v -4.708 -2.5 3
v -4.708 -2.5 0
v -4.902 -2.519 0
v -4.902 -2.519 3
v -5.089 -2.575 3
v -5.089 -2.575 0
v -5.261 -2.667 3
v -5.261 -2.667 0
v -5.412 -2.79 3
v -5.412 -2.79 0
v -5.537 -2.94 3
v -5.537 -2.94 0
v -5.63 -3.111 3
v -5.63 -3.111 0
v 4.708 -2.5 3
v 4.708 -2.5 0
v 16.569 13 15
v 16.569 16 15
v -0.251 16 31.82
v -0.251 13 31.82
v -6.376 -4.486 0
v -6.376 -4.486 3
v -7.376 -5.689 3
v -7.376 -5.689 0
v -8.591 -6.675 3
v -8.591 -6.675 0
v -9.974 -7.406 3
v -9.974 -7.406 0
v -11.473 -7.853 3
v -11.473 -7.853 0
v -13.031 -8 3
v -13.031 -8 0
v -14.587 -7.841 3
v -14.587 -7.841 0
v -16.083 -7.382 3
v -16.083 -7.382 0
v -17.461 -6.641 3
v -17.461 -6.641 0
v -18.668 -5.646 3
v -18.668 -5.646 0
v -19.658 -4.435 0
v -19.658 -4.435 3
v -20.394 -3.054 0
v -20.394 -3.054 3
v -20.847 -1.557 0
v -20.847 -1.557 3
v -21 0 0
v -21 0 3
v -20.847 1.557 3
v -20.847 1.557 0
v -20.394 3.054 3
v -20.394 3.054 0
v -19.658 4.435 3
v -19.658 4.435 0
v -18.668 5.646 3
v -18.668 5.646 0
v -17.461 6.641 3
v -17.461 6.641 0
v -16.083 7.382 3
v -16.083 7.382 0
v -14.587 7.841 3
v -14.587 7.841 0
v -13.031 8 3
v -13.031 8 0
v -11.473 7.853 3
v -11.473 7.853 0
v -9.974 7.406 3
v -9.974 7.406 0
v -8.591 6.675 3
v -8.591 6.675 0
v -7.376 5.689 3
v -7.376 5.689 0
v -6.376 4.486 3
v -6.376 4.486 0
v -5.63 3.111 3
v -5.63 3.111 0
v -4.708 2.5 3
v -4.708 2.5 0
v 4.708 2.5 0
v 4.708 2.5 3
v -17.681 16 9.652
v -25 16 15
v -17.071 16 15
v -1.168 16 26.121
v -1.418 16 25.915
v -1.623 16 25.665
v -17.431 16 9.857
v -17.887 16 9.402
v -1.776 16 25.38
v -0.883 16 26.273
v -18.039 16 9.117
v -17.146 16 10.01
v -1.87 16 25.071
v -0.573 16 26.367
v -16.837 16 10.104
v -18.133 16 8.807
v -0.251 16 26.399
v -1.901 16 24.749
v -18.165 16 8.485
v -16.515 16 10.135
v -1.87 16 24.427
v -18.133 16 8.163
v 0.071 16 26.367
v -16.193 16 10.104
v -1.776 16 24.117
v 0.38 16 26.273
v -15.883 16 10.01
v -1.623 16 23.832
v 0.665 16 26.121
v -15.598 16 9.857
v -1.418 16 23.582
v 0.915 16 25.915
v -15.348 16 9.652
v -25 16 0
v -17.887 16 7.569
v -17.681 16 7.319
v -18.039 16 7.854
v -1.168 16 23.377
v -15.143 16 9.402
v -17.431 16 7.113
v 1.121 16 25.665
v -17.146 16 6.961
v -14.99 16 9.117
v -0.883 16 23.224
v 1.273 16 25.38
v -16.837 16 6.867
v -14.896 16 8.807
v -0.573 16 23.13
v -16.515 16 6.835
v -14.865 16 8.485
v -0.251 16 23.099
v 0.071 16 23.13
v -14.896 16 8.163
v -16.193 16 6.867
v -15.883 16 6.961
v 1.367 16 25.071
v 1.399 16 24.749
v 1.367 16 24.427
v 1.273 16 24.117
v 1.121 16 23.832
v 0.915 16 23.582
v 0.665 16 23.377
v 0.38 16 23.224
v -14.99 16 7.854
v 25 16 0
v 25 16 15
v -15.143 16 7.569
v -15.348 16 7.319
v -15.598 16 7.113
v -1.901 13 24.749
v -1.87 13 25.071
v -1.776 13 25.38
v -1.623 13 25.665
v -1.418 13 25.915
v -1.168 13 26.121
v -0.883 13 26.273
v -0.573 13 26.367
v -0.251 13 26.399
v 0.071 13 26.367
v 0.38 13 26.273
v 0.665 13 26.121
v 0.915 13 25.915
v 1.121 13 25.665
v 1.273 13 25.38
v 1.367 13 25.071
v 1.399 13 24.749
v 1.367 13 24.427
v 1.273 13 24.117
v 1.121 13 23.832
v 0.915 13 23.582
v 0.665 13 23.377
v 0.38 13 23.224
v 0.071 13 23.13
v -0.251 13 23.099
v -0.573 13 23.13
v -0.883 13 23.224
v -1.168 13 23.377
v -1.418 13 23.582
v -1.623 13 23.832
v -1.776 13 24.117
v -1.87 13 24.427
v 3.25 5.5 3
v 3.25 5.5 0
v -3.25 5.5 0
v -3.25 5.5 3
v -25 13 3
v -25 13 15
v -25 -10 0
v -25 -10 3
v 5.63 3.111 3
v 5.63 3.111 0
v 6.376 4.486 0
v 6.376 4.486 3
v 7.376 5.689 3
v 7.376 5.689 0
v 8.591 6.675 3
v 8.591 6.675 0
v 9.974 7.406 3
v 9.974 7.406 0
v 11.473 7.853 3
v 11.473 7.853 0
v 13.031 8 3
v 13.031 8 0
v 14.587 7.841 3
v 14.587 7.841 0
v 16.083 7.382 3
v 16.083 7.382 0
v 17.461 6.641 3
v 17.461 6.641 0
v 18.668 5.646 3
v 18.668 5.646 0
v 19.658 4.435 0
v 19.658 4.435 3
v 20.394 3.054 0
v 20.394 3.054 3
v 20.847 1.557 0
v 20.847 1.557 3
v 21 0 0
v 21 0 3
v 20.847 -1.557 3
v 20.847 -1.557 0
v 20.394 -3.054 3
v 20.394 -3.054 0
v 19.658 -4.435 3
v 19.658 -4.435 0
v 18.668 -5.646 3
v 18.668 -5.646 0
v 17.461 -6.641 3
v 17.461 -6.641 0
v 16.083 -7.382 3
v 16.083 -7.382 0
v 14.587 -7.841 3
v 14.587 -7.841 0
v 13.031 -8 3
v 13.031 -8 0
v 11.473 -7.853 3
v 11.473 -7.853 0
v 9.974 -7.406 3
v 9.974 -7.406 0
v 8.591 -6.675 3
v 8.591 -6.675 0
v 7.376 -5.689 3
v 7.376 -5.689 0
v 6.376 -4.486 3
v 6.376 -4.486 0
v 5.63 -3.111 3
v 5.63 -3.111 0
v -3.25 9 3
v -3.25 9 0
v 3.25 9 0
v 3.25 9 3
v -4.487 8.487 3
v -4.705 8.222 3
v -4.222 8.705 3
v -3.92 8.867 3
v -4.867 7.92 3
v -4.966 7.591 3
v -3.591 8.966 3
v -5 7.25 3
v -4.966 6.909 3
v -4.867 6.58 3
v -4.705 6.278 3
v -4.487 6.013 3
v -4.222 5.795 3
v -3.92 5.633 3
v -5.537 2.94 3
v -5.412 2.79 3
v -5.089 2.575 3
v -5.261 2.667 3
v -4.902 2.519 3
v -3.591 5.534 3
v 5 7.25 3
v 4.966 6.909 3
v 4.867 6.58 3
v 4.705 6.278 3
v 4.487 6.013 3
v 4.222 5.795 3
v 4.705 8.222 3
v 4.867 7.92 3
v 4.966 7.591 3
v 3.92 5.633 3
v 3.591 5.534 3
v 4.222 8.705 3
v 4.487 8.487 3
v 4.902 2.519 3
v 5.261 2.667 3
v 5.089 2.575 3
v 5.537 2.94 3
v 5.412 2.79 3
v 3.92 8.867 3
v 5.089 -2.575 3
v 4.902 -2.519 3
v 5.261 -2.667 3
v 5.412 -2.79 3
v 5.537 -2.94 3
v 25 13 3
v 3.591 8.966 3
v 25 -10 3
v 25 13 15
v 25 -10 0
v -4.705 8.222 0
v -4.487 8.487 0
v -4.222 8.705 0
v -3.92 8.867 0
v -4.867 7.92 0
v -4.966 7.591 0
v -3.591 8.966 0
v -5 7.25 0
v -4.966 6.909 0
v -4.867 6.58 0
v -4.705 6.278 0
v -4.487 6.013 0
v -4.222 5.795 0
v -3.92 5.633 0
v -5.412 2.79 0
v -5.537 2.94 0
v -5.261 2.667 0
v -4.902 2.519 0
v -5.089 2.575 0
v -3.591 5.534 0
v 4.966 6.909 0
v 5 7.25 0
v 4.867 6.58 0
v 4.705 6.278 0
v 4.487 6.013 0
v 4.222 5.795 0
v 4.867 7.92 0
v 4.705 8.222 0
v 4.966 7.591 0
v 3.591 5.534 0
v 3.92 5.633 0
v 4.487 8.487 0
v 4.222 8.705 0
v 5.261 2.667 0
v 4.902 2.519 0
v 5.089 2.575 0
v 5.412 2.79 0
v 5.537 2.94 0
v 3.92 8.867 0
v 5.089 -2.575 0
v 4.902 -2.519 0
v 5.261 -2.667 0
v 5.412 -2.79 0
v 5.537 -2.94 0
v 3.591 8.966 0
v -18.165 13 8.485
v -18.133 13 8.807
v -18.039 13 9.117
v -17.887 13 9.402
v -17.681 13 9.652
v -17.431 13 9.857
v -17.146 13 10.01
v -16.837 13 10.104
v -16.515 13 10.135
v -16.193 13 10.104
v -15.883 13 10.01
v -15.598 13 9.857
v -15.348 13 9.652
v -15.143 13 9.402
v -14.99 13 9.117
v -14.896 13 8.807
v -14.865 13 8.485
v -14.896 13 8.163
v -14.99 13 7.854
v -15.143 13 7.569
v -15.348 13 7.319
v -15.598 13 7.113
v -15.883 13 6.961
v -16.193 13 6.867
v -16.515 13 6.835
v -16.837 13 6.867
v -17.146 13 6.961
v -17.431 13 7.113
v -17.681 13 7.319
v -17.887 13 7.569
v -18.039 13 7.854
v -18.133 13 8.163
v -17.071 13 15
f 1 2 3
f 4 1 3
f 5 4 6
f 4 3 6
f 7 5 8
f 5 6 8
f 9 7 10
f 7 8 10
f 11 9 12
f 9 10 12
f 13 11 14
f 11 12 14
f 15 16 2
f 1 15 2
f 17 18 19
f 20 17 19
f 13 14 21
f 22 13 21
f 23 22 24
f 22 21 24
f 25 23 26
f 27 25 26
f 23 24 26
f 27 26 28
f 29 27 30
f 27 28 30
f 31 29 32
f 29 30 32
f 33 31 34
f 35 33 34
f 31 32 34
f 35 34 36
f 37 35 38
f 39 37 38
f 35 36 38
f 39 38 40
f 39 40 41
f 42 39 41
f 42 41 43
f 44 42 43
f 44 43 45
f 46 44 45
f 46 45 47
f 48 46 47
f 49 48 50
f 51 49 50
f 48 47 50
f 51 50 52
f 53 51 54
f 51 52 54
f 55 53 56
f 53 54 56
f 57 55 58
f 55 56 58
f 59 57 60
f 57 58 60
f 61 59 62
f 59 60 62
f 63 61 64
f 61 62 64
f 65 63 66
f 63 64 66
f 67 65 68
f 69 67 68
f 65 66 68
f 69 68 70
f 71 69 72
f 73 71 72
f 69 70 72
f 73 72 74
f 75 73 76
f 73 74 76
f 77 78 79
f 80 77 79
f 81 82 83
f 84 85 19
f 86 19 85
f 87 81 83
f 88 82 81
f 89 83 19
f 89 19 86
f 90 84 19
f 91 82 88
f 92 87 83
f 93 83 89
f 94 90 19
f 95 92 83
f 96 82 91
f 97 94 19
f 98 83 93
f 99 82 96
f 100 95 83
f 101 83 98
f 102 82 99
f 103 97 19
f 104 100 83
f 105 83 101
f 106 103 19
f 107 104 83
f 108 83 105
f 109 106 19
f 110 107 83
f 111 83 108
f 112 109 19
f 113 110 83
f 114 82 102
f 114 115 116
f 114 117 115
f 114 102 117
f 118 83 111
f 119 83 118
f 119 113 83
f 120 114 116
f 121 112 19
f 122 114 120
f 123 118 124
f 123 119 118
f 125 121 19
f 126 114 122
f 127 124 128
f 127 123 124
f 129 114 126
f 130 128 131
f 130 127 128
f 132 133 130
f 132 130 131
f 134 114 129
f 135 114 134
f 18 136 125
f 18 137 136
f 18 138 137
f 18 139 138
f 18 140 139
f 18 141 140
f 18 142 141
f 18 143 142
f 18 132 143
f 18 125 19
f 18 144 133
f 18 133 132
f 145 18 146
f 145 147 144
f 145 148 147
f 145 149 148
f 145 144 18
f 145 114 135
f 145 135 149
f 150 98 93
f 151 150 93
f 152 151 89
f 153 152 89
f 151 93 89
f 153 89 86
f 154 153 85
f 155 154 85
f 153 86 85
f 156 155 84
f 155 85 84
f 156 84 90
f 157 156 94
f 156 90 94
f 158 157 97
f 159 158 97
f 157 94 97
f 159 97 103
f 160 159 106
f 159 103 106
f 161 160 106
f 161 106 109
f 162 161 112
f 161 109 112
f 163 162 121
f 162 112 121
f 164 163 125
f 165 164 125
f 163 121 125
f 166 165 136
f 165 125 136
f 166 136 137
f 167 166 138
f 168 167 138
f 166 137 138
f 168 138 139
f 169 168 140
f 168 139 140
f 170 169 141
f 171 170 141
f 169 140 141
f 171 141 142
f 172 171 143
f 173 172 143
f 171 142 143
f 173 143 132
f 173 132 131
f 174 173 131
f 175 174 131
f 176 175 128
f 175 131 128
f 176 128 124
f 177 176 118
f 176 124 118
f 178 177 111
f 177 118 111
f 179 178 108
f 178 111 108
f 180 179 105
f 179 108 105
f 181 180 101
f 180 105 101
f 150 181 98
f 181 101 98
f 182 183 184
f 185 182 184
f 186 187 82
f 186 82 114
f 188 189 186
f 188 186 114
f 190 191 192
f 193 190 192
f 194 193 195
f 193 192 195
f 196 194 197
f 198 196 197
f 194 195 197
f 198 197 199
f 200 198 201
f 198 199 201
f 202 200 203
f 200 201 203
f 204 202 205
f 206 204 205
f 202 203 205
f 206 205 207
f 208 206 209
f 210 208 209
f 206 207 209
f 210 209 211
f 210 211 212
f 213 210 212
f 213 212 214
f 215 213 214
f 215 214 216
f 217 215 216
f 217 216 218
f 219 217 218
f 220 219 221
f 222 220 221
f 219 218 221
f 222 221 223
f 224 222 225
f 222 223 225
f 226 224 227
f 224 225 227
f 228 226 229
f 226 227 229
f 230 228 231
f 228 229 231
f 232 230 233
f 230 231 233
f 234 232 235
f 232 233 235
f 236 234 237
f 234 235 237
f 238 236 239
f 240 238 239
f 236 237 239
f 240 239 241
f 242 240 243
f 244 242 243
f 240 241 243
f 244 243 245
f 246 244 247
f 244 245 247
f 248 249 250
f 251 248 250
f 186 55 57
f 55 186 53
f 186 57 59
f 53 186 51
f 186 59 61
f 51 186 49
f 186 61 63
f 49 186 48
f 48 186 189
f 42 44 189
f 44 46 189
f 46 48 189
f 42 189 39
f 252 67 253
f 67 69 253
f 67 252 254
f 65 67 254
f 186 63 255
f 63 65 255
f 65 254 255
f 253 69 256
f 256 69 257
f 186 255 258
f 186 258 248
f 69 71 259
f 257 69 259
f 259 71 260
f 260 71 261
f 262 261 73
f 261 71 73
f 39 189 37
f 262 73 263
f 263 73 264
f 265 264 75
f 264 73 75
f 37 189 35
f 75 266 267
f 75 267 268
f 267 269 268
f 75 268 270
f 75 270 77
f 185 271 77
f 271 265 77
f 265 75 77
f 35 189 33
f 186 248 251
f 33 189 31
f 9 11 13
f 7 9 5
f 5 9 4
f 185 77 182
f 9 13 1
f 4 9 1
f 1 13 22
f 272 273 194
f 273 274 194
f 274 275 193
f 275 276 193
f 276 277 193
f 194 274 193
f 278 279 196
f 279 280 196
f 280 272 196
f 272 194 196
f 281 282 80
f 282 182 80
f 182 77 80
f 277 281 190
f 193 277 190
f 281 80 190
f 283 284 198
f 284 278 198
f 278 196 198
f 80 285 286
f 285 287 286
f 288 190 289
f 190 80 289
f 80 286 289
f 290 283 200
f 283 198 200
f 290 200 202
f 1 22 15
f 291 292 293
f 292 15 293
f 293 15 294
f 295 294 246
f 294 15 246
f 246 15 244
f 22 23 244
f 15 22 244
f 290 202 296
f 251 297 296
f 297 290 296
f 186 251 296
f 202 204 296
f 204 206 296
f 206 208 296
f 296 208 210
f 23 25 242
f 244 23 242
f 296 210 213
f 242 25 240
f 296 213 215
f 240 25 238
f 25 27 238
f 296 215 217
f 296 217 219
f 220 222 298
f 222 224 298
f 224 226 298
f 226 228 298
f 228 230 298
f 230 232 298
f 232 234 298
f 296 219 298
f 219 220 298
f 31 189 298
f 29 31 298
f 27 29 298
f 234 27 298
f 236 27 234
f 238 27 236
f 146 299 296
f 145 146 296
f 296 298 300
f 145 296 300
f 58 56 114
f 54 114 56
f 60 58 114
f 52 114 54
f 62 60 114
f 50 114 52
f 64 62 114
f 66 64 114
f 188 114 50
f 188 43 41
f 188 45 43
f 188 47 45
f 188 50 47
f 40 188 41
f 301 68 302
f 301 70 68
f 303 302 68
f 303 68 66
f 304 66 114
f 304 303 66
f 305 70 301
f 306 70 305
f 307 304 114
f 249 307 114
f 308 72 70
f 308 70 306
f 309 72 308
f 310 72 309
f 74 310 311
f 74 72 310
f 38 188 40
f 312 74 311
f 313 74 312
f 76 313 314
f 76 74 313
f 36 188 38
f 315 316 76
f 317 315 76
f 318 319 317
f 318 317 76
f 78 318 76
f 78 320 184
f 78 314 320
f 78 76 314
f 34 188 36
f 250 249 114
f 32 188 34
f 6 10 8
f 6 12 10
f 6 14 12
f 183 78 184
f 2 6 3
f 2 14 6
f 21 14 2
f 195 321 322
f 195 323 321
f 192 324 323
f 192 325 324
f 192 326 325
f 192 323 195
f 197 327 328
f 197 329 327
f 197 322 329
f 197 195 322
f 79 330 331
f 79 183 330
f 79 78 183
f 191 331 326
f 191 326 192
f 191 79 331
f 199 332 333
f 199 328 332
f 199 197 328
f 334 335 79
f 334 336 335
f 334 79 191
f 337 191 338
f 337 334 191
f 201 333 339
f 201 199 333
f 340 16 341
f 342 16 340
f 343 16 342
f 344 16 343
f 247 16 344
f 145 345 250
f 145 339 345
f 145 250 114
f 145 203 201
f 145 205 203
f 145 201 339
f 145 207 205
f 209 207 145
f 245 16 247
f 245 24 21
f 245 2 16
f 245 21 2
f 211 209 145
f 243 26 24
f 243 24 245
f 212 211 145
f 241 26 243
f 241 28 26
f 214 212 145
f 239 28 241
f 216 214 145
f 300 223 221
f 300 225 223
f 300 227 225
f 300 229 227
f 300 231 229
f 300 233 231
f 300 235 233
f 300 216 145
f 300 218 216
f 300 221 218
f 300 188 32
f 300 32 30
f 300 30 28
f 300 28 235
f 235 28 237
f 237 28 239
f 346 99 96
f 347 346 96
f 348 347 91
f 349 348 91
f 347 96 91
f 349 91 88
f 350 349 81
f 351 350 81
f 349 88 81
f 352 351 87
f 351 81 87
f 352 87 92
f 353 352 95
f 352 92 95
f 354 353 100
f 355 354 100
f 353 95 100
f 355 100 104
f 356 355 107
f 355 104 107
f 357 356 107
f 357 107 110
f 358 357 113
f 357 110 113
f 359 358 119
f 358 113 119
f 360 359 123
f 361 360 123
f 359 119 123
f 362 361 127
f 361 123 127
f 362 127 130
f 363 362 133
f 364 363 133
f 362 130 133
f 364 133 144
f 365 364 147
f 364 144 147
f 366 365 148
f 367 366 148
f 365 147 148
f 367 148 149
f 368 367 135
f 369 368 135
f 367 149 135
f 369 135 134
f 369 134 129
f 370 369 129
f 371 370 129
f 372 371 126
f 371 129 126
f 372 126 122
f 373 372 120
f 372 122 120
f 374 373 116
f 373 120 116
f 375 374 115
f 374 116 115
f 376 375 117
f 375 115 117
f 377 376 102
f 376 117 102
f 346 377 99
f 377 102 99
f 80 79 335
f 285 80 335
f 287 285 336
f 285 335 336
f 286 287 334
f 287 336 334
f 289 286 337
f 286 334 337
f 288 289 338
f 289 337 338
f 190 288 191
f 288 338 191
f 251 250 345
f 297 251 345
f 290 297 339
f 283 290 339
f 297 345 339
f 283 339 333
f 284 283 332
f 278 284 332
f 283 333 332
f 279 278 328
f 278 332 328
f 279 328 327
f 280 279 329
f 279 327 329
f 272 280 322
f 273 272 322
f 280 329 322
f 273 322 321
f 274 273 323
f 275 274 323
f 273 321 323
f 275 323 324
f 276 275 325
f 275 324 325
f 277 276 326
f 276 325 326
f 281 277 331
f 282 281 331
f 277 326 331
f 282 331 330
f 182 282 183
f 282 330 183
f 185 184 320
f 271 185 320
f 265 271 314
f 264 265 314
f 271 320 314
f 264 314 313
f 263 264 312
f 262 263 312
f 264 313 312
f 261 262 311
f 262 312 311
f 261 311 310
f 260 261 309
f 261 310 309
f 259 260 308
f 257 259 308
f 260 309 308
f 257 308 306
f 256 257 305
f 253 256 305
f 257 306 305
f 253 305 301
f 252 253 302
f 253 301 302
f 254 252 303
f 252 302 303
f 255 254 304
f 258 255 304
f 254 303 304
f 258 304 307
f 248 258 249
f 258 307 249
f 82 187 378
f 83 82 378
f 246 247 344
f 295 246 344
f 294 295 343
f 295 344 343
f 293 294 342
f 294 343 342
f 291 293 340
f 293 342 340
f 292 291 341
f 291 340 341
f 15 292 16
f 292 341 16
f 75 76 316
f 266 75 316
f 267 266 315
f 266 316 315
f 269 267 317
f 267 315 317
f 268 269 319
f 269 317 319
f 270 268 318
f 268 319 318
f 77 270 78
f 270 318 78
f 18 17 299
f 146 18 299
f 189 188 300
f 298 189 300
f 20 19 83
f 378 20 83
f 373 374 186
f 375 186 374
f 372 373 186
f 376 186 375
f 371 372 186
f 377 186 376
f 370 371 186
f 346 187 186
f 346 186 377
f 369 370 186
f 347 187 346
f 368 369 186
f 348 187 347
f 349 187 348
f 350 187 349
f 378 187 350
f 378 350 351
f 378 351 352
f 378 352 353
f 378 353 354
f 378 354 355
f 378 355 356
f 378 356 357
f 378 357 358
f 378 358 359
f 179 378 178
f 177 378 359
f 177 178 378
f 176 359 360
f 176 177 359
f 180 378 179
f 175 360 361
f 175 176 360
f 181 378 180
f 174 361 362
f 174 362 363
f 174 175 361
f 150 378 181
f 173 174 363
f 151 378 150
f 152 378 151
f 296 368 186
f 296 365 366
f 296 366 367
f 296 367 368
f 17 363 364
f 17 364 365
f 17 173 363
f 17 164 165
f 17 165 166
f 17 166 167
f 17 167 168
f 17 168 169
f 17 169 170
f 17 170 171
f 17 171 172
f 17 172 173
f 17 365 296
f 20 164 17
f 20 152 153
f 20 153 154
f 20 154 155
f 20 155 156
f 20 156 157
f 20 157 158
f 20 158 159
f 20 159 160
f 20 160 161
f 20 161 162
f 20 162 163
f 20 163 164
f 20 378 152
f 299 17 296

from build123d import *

# Parameters (mm, degrees)
SKETCH_1_W          = 50
SKETCH_1_H          = 20
EXTRUDE_1_DEPTH     = 3
SKETCH_2_W          = 50
SKETCH_2_H          = 15
EXTRUDE_2_DEPTH     = 6
SKETCH_5_W          = 50
SKETCH_5_H          = 12
CUT_EXTRUDE_2_DEPTH = 3
SKETCH_7_R          = 1.65
EXTRUDE_3_DEPTH     = 3
SKETCH_8_R          = 1.65
CUT_EXTRUDE_3_DEPTH = 3


with BuildPart() as part:
    # 草图1 → 凸台-拉伸1 (new body)
    with BuildSketch(Plane.XY):
        Rectangle(SKETCH_1_W, SKETCH_1_H)
        with BuildLine():
            Line((-4.708438024, 2.5), (4.708438024, 2.5))
            ThreePointArc((4.708438024, 2.5), (5.261208823, 2.666666667), (5.629722688, 3.111111111))
            ThreePointArc((5.629722688, 3.111111111), (21, 0), (5.629722688, -3.111111111))
            ThreePointArc((5.629722688, -3.111111111), (5.261208823, -2.666666667), (4.708438024, -2.5))
            Line((4.708438024, -2.5), (-4.708438024, -2.5))
            ThreePointArc((-4.708438024, -2.5), (-5.261208823, -2.666666667), (-5.629722688, -3.111111111))
            ThreePointArc((-5.629722688, -3.111111111), (-21, 0), (-5.629722688, 3.111111111))
            ThreePointArc((-5.629722688, 3.111111111), (-5.261208823, 2.666666667), (-4.708438024, 2.5))
        make_face(mode=Mode.SUBTRACT)
        with BuildLine():
            Line((3.25, 5.5), (-3.25, 5.5))
            ThreePointArc((-3.25, 5.5), (-5, 7.25), (-3.25, 9))
            Line((-3.25, 9), (3.25, 9))
            ThreePointArc((3.25, 9), (5, 7.25), (3.25, 5.5))
        make_face(mode=Mode.SUBTRACT)
    extrude(amount=EXTRUDE_1_DEPTH)

    # 草图2 → 凸台-拉伸2 (add)
    with BuildSketch(Plane(origin=(0, 10, 0), x_dir=(1, 0, 0), z_dir=(0, 1, 0))):
        with Locations((0, -7.5)):
            Rectangle(SKETCH_2_W, SKETCH_2_H)
    extrude(amount=EXTRUDE_2_DEPTH)

    # 草图5 → 切除-拉伸2 (cut)
    with BuildSketch(Plane.XZ.offset(-10)):
        with Locations((0, 9)):
            Rectangle(SKETCH_5_W, SKETCH_5_H)
    extrude(amount=-CUT_EXTRUDE_2_DEPTH, mode=Mode.SUBTRACT)

    # 草图7 → 凸台-拉伸3 (add)
    with BuildSketch(Plane(origin=(0, 16, 0), x_dir=(1, 0, 0), z_dir=(0, 1, 0))):
        Polygon((-0.251262658, -31.819805153), (-17.071067812, -15), (16.568542495, -15), align=None)
        with Locations(Location((-0.251262658, -24.748737342, 0), (0, 0, 180))):
            Circle(SKETCH_7_R, mode=Mode.SUBTRACT)
    extrude(amount=-EXTRUDE_3_DEPTH)

    # 草图8 → 切除-拉伸3 (cut)
    with BuildSketch(Plane(origin=(0, 16, 0), x_dir=(1, 0, 0), z_dir=(0, 1, 0))):
        with Locations(Location((-16.514718626, -8.485281374, 0), (0, 0, 180))):
            Circle(SKETCH_8_R)
    extrude(amount=-CUT_EXTRUDE_3_DEPTH, mode=Mode.SUBTRACT)


solid = part.part
